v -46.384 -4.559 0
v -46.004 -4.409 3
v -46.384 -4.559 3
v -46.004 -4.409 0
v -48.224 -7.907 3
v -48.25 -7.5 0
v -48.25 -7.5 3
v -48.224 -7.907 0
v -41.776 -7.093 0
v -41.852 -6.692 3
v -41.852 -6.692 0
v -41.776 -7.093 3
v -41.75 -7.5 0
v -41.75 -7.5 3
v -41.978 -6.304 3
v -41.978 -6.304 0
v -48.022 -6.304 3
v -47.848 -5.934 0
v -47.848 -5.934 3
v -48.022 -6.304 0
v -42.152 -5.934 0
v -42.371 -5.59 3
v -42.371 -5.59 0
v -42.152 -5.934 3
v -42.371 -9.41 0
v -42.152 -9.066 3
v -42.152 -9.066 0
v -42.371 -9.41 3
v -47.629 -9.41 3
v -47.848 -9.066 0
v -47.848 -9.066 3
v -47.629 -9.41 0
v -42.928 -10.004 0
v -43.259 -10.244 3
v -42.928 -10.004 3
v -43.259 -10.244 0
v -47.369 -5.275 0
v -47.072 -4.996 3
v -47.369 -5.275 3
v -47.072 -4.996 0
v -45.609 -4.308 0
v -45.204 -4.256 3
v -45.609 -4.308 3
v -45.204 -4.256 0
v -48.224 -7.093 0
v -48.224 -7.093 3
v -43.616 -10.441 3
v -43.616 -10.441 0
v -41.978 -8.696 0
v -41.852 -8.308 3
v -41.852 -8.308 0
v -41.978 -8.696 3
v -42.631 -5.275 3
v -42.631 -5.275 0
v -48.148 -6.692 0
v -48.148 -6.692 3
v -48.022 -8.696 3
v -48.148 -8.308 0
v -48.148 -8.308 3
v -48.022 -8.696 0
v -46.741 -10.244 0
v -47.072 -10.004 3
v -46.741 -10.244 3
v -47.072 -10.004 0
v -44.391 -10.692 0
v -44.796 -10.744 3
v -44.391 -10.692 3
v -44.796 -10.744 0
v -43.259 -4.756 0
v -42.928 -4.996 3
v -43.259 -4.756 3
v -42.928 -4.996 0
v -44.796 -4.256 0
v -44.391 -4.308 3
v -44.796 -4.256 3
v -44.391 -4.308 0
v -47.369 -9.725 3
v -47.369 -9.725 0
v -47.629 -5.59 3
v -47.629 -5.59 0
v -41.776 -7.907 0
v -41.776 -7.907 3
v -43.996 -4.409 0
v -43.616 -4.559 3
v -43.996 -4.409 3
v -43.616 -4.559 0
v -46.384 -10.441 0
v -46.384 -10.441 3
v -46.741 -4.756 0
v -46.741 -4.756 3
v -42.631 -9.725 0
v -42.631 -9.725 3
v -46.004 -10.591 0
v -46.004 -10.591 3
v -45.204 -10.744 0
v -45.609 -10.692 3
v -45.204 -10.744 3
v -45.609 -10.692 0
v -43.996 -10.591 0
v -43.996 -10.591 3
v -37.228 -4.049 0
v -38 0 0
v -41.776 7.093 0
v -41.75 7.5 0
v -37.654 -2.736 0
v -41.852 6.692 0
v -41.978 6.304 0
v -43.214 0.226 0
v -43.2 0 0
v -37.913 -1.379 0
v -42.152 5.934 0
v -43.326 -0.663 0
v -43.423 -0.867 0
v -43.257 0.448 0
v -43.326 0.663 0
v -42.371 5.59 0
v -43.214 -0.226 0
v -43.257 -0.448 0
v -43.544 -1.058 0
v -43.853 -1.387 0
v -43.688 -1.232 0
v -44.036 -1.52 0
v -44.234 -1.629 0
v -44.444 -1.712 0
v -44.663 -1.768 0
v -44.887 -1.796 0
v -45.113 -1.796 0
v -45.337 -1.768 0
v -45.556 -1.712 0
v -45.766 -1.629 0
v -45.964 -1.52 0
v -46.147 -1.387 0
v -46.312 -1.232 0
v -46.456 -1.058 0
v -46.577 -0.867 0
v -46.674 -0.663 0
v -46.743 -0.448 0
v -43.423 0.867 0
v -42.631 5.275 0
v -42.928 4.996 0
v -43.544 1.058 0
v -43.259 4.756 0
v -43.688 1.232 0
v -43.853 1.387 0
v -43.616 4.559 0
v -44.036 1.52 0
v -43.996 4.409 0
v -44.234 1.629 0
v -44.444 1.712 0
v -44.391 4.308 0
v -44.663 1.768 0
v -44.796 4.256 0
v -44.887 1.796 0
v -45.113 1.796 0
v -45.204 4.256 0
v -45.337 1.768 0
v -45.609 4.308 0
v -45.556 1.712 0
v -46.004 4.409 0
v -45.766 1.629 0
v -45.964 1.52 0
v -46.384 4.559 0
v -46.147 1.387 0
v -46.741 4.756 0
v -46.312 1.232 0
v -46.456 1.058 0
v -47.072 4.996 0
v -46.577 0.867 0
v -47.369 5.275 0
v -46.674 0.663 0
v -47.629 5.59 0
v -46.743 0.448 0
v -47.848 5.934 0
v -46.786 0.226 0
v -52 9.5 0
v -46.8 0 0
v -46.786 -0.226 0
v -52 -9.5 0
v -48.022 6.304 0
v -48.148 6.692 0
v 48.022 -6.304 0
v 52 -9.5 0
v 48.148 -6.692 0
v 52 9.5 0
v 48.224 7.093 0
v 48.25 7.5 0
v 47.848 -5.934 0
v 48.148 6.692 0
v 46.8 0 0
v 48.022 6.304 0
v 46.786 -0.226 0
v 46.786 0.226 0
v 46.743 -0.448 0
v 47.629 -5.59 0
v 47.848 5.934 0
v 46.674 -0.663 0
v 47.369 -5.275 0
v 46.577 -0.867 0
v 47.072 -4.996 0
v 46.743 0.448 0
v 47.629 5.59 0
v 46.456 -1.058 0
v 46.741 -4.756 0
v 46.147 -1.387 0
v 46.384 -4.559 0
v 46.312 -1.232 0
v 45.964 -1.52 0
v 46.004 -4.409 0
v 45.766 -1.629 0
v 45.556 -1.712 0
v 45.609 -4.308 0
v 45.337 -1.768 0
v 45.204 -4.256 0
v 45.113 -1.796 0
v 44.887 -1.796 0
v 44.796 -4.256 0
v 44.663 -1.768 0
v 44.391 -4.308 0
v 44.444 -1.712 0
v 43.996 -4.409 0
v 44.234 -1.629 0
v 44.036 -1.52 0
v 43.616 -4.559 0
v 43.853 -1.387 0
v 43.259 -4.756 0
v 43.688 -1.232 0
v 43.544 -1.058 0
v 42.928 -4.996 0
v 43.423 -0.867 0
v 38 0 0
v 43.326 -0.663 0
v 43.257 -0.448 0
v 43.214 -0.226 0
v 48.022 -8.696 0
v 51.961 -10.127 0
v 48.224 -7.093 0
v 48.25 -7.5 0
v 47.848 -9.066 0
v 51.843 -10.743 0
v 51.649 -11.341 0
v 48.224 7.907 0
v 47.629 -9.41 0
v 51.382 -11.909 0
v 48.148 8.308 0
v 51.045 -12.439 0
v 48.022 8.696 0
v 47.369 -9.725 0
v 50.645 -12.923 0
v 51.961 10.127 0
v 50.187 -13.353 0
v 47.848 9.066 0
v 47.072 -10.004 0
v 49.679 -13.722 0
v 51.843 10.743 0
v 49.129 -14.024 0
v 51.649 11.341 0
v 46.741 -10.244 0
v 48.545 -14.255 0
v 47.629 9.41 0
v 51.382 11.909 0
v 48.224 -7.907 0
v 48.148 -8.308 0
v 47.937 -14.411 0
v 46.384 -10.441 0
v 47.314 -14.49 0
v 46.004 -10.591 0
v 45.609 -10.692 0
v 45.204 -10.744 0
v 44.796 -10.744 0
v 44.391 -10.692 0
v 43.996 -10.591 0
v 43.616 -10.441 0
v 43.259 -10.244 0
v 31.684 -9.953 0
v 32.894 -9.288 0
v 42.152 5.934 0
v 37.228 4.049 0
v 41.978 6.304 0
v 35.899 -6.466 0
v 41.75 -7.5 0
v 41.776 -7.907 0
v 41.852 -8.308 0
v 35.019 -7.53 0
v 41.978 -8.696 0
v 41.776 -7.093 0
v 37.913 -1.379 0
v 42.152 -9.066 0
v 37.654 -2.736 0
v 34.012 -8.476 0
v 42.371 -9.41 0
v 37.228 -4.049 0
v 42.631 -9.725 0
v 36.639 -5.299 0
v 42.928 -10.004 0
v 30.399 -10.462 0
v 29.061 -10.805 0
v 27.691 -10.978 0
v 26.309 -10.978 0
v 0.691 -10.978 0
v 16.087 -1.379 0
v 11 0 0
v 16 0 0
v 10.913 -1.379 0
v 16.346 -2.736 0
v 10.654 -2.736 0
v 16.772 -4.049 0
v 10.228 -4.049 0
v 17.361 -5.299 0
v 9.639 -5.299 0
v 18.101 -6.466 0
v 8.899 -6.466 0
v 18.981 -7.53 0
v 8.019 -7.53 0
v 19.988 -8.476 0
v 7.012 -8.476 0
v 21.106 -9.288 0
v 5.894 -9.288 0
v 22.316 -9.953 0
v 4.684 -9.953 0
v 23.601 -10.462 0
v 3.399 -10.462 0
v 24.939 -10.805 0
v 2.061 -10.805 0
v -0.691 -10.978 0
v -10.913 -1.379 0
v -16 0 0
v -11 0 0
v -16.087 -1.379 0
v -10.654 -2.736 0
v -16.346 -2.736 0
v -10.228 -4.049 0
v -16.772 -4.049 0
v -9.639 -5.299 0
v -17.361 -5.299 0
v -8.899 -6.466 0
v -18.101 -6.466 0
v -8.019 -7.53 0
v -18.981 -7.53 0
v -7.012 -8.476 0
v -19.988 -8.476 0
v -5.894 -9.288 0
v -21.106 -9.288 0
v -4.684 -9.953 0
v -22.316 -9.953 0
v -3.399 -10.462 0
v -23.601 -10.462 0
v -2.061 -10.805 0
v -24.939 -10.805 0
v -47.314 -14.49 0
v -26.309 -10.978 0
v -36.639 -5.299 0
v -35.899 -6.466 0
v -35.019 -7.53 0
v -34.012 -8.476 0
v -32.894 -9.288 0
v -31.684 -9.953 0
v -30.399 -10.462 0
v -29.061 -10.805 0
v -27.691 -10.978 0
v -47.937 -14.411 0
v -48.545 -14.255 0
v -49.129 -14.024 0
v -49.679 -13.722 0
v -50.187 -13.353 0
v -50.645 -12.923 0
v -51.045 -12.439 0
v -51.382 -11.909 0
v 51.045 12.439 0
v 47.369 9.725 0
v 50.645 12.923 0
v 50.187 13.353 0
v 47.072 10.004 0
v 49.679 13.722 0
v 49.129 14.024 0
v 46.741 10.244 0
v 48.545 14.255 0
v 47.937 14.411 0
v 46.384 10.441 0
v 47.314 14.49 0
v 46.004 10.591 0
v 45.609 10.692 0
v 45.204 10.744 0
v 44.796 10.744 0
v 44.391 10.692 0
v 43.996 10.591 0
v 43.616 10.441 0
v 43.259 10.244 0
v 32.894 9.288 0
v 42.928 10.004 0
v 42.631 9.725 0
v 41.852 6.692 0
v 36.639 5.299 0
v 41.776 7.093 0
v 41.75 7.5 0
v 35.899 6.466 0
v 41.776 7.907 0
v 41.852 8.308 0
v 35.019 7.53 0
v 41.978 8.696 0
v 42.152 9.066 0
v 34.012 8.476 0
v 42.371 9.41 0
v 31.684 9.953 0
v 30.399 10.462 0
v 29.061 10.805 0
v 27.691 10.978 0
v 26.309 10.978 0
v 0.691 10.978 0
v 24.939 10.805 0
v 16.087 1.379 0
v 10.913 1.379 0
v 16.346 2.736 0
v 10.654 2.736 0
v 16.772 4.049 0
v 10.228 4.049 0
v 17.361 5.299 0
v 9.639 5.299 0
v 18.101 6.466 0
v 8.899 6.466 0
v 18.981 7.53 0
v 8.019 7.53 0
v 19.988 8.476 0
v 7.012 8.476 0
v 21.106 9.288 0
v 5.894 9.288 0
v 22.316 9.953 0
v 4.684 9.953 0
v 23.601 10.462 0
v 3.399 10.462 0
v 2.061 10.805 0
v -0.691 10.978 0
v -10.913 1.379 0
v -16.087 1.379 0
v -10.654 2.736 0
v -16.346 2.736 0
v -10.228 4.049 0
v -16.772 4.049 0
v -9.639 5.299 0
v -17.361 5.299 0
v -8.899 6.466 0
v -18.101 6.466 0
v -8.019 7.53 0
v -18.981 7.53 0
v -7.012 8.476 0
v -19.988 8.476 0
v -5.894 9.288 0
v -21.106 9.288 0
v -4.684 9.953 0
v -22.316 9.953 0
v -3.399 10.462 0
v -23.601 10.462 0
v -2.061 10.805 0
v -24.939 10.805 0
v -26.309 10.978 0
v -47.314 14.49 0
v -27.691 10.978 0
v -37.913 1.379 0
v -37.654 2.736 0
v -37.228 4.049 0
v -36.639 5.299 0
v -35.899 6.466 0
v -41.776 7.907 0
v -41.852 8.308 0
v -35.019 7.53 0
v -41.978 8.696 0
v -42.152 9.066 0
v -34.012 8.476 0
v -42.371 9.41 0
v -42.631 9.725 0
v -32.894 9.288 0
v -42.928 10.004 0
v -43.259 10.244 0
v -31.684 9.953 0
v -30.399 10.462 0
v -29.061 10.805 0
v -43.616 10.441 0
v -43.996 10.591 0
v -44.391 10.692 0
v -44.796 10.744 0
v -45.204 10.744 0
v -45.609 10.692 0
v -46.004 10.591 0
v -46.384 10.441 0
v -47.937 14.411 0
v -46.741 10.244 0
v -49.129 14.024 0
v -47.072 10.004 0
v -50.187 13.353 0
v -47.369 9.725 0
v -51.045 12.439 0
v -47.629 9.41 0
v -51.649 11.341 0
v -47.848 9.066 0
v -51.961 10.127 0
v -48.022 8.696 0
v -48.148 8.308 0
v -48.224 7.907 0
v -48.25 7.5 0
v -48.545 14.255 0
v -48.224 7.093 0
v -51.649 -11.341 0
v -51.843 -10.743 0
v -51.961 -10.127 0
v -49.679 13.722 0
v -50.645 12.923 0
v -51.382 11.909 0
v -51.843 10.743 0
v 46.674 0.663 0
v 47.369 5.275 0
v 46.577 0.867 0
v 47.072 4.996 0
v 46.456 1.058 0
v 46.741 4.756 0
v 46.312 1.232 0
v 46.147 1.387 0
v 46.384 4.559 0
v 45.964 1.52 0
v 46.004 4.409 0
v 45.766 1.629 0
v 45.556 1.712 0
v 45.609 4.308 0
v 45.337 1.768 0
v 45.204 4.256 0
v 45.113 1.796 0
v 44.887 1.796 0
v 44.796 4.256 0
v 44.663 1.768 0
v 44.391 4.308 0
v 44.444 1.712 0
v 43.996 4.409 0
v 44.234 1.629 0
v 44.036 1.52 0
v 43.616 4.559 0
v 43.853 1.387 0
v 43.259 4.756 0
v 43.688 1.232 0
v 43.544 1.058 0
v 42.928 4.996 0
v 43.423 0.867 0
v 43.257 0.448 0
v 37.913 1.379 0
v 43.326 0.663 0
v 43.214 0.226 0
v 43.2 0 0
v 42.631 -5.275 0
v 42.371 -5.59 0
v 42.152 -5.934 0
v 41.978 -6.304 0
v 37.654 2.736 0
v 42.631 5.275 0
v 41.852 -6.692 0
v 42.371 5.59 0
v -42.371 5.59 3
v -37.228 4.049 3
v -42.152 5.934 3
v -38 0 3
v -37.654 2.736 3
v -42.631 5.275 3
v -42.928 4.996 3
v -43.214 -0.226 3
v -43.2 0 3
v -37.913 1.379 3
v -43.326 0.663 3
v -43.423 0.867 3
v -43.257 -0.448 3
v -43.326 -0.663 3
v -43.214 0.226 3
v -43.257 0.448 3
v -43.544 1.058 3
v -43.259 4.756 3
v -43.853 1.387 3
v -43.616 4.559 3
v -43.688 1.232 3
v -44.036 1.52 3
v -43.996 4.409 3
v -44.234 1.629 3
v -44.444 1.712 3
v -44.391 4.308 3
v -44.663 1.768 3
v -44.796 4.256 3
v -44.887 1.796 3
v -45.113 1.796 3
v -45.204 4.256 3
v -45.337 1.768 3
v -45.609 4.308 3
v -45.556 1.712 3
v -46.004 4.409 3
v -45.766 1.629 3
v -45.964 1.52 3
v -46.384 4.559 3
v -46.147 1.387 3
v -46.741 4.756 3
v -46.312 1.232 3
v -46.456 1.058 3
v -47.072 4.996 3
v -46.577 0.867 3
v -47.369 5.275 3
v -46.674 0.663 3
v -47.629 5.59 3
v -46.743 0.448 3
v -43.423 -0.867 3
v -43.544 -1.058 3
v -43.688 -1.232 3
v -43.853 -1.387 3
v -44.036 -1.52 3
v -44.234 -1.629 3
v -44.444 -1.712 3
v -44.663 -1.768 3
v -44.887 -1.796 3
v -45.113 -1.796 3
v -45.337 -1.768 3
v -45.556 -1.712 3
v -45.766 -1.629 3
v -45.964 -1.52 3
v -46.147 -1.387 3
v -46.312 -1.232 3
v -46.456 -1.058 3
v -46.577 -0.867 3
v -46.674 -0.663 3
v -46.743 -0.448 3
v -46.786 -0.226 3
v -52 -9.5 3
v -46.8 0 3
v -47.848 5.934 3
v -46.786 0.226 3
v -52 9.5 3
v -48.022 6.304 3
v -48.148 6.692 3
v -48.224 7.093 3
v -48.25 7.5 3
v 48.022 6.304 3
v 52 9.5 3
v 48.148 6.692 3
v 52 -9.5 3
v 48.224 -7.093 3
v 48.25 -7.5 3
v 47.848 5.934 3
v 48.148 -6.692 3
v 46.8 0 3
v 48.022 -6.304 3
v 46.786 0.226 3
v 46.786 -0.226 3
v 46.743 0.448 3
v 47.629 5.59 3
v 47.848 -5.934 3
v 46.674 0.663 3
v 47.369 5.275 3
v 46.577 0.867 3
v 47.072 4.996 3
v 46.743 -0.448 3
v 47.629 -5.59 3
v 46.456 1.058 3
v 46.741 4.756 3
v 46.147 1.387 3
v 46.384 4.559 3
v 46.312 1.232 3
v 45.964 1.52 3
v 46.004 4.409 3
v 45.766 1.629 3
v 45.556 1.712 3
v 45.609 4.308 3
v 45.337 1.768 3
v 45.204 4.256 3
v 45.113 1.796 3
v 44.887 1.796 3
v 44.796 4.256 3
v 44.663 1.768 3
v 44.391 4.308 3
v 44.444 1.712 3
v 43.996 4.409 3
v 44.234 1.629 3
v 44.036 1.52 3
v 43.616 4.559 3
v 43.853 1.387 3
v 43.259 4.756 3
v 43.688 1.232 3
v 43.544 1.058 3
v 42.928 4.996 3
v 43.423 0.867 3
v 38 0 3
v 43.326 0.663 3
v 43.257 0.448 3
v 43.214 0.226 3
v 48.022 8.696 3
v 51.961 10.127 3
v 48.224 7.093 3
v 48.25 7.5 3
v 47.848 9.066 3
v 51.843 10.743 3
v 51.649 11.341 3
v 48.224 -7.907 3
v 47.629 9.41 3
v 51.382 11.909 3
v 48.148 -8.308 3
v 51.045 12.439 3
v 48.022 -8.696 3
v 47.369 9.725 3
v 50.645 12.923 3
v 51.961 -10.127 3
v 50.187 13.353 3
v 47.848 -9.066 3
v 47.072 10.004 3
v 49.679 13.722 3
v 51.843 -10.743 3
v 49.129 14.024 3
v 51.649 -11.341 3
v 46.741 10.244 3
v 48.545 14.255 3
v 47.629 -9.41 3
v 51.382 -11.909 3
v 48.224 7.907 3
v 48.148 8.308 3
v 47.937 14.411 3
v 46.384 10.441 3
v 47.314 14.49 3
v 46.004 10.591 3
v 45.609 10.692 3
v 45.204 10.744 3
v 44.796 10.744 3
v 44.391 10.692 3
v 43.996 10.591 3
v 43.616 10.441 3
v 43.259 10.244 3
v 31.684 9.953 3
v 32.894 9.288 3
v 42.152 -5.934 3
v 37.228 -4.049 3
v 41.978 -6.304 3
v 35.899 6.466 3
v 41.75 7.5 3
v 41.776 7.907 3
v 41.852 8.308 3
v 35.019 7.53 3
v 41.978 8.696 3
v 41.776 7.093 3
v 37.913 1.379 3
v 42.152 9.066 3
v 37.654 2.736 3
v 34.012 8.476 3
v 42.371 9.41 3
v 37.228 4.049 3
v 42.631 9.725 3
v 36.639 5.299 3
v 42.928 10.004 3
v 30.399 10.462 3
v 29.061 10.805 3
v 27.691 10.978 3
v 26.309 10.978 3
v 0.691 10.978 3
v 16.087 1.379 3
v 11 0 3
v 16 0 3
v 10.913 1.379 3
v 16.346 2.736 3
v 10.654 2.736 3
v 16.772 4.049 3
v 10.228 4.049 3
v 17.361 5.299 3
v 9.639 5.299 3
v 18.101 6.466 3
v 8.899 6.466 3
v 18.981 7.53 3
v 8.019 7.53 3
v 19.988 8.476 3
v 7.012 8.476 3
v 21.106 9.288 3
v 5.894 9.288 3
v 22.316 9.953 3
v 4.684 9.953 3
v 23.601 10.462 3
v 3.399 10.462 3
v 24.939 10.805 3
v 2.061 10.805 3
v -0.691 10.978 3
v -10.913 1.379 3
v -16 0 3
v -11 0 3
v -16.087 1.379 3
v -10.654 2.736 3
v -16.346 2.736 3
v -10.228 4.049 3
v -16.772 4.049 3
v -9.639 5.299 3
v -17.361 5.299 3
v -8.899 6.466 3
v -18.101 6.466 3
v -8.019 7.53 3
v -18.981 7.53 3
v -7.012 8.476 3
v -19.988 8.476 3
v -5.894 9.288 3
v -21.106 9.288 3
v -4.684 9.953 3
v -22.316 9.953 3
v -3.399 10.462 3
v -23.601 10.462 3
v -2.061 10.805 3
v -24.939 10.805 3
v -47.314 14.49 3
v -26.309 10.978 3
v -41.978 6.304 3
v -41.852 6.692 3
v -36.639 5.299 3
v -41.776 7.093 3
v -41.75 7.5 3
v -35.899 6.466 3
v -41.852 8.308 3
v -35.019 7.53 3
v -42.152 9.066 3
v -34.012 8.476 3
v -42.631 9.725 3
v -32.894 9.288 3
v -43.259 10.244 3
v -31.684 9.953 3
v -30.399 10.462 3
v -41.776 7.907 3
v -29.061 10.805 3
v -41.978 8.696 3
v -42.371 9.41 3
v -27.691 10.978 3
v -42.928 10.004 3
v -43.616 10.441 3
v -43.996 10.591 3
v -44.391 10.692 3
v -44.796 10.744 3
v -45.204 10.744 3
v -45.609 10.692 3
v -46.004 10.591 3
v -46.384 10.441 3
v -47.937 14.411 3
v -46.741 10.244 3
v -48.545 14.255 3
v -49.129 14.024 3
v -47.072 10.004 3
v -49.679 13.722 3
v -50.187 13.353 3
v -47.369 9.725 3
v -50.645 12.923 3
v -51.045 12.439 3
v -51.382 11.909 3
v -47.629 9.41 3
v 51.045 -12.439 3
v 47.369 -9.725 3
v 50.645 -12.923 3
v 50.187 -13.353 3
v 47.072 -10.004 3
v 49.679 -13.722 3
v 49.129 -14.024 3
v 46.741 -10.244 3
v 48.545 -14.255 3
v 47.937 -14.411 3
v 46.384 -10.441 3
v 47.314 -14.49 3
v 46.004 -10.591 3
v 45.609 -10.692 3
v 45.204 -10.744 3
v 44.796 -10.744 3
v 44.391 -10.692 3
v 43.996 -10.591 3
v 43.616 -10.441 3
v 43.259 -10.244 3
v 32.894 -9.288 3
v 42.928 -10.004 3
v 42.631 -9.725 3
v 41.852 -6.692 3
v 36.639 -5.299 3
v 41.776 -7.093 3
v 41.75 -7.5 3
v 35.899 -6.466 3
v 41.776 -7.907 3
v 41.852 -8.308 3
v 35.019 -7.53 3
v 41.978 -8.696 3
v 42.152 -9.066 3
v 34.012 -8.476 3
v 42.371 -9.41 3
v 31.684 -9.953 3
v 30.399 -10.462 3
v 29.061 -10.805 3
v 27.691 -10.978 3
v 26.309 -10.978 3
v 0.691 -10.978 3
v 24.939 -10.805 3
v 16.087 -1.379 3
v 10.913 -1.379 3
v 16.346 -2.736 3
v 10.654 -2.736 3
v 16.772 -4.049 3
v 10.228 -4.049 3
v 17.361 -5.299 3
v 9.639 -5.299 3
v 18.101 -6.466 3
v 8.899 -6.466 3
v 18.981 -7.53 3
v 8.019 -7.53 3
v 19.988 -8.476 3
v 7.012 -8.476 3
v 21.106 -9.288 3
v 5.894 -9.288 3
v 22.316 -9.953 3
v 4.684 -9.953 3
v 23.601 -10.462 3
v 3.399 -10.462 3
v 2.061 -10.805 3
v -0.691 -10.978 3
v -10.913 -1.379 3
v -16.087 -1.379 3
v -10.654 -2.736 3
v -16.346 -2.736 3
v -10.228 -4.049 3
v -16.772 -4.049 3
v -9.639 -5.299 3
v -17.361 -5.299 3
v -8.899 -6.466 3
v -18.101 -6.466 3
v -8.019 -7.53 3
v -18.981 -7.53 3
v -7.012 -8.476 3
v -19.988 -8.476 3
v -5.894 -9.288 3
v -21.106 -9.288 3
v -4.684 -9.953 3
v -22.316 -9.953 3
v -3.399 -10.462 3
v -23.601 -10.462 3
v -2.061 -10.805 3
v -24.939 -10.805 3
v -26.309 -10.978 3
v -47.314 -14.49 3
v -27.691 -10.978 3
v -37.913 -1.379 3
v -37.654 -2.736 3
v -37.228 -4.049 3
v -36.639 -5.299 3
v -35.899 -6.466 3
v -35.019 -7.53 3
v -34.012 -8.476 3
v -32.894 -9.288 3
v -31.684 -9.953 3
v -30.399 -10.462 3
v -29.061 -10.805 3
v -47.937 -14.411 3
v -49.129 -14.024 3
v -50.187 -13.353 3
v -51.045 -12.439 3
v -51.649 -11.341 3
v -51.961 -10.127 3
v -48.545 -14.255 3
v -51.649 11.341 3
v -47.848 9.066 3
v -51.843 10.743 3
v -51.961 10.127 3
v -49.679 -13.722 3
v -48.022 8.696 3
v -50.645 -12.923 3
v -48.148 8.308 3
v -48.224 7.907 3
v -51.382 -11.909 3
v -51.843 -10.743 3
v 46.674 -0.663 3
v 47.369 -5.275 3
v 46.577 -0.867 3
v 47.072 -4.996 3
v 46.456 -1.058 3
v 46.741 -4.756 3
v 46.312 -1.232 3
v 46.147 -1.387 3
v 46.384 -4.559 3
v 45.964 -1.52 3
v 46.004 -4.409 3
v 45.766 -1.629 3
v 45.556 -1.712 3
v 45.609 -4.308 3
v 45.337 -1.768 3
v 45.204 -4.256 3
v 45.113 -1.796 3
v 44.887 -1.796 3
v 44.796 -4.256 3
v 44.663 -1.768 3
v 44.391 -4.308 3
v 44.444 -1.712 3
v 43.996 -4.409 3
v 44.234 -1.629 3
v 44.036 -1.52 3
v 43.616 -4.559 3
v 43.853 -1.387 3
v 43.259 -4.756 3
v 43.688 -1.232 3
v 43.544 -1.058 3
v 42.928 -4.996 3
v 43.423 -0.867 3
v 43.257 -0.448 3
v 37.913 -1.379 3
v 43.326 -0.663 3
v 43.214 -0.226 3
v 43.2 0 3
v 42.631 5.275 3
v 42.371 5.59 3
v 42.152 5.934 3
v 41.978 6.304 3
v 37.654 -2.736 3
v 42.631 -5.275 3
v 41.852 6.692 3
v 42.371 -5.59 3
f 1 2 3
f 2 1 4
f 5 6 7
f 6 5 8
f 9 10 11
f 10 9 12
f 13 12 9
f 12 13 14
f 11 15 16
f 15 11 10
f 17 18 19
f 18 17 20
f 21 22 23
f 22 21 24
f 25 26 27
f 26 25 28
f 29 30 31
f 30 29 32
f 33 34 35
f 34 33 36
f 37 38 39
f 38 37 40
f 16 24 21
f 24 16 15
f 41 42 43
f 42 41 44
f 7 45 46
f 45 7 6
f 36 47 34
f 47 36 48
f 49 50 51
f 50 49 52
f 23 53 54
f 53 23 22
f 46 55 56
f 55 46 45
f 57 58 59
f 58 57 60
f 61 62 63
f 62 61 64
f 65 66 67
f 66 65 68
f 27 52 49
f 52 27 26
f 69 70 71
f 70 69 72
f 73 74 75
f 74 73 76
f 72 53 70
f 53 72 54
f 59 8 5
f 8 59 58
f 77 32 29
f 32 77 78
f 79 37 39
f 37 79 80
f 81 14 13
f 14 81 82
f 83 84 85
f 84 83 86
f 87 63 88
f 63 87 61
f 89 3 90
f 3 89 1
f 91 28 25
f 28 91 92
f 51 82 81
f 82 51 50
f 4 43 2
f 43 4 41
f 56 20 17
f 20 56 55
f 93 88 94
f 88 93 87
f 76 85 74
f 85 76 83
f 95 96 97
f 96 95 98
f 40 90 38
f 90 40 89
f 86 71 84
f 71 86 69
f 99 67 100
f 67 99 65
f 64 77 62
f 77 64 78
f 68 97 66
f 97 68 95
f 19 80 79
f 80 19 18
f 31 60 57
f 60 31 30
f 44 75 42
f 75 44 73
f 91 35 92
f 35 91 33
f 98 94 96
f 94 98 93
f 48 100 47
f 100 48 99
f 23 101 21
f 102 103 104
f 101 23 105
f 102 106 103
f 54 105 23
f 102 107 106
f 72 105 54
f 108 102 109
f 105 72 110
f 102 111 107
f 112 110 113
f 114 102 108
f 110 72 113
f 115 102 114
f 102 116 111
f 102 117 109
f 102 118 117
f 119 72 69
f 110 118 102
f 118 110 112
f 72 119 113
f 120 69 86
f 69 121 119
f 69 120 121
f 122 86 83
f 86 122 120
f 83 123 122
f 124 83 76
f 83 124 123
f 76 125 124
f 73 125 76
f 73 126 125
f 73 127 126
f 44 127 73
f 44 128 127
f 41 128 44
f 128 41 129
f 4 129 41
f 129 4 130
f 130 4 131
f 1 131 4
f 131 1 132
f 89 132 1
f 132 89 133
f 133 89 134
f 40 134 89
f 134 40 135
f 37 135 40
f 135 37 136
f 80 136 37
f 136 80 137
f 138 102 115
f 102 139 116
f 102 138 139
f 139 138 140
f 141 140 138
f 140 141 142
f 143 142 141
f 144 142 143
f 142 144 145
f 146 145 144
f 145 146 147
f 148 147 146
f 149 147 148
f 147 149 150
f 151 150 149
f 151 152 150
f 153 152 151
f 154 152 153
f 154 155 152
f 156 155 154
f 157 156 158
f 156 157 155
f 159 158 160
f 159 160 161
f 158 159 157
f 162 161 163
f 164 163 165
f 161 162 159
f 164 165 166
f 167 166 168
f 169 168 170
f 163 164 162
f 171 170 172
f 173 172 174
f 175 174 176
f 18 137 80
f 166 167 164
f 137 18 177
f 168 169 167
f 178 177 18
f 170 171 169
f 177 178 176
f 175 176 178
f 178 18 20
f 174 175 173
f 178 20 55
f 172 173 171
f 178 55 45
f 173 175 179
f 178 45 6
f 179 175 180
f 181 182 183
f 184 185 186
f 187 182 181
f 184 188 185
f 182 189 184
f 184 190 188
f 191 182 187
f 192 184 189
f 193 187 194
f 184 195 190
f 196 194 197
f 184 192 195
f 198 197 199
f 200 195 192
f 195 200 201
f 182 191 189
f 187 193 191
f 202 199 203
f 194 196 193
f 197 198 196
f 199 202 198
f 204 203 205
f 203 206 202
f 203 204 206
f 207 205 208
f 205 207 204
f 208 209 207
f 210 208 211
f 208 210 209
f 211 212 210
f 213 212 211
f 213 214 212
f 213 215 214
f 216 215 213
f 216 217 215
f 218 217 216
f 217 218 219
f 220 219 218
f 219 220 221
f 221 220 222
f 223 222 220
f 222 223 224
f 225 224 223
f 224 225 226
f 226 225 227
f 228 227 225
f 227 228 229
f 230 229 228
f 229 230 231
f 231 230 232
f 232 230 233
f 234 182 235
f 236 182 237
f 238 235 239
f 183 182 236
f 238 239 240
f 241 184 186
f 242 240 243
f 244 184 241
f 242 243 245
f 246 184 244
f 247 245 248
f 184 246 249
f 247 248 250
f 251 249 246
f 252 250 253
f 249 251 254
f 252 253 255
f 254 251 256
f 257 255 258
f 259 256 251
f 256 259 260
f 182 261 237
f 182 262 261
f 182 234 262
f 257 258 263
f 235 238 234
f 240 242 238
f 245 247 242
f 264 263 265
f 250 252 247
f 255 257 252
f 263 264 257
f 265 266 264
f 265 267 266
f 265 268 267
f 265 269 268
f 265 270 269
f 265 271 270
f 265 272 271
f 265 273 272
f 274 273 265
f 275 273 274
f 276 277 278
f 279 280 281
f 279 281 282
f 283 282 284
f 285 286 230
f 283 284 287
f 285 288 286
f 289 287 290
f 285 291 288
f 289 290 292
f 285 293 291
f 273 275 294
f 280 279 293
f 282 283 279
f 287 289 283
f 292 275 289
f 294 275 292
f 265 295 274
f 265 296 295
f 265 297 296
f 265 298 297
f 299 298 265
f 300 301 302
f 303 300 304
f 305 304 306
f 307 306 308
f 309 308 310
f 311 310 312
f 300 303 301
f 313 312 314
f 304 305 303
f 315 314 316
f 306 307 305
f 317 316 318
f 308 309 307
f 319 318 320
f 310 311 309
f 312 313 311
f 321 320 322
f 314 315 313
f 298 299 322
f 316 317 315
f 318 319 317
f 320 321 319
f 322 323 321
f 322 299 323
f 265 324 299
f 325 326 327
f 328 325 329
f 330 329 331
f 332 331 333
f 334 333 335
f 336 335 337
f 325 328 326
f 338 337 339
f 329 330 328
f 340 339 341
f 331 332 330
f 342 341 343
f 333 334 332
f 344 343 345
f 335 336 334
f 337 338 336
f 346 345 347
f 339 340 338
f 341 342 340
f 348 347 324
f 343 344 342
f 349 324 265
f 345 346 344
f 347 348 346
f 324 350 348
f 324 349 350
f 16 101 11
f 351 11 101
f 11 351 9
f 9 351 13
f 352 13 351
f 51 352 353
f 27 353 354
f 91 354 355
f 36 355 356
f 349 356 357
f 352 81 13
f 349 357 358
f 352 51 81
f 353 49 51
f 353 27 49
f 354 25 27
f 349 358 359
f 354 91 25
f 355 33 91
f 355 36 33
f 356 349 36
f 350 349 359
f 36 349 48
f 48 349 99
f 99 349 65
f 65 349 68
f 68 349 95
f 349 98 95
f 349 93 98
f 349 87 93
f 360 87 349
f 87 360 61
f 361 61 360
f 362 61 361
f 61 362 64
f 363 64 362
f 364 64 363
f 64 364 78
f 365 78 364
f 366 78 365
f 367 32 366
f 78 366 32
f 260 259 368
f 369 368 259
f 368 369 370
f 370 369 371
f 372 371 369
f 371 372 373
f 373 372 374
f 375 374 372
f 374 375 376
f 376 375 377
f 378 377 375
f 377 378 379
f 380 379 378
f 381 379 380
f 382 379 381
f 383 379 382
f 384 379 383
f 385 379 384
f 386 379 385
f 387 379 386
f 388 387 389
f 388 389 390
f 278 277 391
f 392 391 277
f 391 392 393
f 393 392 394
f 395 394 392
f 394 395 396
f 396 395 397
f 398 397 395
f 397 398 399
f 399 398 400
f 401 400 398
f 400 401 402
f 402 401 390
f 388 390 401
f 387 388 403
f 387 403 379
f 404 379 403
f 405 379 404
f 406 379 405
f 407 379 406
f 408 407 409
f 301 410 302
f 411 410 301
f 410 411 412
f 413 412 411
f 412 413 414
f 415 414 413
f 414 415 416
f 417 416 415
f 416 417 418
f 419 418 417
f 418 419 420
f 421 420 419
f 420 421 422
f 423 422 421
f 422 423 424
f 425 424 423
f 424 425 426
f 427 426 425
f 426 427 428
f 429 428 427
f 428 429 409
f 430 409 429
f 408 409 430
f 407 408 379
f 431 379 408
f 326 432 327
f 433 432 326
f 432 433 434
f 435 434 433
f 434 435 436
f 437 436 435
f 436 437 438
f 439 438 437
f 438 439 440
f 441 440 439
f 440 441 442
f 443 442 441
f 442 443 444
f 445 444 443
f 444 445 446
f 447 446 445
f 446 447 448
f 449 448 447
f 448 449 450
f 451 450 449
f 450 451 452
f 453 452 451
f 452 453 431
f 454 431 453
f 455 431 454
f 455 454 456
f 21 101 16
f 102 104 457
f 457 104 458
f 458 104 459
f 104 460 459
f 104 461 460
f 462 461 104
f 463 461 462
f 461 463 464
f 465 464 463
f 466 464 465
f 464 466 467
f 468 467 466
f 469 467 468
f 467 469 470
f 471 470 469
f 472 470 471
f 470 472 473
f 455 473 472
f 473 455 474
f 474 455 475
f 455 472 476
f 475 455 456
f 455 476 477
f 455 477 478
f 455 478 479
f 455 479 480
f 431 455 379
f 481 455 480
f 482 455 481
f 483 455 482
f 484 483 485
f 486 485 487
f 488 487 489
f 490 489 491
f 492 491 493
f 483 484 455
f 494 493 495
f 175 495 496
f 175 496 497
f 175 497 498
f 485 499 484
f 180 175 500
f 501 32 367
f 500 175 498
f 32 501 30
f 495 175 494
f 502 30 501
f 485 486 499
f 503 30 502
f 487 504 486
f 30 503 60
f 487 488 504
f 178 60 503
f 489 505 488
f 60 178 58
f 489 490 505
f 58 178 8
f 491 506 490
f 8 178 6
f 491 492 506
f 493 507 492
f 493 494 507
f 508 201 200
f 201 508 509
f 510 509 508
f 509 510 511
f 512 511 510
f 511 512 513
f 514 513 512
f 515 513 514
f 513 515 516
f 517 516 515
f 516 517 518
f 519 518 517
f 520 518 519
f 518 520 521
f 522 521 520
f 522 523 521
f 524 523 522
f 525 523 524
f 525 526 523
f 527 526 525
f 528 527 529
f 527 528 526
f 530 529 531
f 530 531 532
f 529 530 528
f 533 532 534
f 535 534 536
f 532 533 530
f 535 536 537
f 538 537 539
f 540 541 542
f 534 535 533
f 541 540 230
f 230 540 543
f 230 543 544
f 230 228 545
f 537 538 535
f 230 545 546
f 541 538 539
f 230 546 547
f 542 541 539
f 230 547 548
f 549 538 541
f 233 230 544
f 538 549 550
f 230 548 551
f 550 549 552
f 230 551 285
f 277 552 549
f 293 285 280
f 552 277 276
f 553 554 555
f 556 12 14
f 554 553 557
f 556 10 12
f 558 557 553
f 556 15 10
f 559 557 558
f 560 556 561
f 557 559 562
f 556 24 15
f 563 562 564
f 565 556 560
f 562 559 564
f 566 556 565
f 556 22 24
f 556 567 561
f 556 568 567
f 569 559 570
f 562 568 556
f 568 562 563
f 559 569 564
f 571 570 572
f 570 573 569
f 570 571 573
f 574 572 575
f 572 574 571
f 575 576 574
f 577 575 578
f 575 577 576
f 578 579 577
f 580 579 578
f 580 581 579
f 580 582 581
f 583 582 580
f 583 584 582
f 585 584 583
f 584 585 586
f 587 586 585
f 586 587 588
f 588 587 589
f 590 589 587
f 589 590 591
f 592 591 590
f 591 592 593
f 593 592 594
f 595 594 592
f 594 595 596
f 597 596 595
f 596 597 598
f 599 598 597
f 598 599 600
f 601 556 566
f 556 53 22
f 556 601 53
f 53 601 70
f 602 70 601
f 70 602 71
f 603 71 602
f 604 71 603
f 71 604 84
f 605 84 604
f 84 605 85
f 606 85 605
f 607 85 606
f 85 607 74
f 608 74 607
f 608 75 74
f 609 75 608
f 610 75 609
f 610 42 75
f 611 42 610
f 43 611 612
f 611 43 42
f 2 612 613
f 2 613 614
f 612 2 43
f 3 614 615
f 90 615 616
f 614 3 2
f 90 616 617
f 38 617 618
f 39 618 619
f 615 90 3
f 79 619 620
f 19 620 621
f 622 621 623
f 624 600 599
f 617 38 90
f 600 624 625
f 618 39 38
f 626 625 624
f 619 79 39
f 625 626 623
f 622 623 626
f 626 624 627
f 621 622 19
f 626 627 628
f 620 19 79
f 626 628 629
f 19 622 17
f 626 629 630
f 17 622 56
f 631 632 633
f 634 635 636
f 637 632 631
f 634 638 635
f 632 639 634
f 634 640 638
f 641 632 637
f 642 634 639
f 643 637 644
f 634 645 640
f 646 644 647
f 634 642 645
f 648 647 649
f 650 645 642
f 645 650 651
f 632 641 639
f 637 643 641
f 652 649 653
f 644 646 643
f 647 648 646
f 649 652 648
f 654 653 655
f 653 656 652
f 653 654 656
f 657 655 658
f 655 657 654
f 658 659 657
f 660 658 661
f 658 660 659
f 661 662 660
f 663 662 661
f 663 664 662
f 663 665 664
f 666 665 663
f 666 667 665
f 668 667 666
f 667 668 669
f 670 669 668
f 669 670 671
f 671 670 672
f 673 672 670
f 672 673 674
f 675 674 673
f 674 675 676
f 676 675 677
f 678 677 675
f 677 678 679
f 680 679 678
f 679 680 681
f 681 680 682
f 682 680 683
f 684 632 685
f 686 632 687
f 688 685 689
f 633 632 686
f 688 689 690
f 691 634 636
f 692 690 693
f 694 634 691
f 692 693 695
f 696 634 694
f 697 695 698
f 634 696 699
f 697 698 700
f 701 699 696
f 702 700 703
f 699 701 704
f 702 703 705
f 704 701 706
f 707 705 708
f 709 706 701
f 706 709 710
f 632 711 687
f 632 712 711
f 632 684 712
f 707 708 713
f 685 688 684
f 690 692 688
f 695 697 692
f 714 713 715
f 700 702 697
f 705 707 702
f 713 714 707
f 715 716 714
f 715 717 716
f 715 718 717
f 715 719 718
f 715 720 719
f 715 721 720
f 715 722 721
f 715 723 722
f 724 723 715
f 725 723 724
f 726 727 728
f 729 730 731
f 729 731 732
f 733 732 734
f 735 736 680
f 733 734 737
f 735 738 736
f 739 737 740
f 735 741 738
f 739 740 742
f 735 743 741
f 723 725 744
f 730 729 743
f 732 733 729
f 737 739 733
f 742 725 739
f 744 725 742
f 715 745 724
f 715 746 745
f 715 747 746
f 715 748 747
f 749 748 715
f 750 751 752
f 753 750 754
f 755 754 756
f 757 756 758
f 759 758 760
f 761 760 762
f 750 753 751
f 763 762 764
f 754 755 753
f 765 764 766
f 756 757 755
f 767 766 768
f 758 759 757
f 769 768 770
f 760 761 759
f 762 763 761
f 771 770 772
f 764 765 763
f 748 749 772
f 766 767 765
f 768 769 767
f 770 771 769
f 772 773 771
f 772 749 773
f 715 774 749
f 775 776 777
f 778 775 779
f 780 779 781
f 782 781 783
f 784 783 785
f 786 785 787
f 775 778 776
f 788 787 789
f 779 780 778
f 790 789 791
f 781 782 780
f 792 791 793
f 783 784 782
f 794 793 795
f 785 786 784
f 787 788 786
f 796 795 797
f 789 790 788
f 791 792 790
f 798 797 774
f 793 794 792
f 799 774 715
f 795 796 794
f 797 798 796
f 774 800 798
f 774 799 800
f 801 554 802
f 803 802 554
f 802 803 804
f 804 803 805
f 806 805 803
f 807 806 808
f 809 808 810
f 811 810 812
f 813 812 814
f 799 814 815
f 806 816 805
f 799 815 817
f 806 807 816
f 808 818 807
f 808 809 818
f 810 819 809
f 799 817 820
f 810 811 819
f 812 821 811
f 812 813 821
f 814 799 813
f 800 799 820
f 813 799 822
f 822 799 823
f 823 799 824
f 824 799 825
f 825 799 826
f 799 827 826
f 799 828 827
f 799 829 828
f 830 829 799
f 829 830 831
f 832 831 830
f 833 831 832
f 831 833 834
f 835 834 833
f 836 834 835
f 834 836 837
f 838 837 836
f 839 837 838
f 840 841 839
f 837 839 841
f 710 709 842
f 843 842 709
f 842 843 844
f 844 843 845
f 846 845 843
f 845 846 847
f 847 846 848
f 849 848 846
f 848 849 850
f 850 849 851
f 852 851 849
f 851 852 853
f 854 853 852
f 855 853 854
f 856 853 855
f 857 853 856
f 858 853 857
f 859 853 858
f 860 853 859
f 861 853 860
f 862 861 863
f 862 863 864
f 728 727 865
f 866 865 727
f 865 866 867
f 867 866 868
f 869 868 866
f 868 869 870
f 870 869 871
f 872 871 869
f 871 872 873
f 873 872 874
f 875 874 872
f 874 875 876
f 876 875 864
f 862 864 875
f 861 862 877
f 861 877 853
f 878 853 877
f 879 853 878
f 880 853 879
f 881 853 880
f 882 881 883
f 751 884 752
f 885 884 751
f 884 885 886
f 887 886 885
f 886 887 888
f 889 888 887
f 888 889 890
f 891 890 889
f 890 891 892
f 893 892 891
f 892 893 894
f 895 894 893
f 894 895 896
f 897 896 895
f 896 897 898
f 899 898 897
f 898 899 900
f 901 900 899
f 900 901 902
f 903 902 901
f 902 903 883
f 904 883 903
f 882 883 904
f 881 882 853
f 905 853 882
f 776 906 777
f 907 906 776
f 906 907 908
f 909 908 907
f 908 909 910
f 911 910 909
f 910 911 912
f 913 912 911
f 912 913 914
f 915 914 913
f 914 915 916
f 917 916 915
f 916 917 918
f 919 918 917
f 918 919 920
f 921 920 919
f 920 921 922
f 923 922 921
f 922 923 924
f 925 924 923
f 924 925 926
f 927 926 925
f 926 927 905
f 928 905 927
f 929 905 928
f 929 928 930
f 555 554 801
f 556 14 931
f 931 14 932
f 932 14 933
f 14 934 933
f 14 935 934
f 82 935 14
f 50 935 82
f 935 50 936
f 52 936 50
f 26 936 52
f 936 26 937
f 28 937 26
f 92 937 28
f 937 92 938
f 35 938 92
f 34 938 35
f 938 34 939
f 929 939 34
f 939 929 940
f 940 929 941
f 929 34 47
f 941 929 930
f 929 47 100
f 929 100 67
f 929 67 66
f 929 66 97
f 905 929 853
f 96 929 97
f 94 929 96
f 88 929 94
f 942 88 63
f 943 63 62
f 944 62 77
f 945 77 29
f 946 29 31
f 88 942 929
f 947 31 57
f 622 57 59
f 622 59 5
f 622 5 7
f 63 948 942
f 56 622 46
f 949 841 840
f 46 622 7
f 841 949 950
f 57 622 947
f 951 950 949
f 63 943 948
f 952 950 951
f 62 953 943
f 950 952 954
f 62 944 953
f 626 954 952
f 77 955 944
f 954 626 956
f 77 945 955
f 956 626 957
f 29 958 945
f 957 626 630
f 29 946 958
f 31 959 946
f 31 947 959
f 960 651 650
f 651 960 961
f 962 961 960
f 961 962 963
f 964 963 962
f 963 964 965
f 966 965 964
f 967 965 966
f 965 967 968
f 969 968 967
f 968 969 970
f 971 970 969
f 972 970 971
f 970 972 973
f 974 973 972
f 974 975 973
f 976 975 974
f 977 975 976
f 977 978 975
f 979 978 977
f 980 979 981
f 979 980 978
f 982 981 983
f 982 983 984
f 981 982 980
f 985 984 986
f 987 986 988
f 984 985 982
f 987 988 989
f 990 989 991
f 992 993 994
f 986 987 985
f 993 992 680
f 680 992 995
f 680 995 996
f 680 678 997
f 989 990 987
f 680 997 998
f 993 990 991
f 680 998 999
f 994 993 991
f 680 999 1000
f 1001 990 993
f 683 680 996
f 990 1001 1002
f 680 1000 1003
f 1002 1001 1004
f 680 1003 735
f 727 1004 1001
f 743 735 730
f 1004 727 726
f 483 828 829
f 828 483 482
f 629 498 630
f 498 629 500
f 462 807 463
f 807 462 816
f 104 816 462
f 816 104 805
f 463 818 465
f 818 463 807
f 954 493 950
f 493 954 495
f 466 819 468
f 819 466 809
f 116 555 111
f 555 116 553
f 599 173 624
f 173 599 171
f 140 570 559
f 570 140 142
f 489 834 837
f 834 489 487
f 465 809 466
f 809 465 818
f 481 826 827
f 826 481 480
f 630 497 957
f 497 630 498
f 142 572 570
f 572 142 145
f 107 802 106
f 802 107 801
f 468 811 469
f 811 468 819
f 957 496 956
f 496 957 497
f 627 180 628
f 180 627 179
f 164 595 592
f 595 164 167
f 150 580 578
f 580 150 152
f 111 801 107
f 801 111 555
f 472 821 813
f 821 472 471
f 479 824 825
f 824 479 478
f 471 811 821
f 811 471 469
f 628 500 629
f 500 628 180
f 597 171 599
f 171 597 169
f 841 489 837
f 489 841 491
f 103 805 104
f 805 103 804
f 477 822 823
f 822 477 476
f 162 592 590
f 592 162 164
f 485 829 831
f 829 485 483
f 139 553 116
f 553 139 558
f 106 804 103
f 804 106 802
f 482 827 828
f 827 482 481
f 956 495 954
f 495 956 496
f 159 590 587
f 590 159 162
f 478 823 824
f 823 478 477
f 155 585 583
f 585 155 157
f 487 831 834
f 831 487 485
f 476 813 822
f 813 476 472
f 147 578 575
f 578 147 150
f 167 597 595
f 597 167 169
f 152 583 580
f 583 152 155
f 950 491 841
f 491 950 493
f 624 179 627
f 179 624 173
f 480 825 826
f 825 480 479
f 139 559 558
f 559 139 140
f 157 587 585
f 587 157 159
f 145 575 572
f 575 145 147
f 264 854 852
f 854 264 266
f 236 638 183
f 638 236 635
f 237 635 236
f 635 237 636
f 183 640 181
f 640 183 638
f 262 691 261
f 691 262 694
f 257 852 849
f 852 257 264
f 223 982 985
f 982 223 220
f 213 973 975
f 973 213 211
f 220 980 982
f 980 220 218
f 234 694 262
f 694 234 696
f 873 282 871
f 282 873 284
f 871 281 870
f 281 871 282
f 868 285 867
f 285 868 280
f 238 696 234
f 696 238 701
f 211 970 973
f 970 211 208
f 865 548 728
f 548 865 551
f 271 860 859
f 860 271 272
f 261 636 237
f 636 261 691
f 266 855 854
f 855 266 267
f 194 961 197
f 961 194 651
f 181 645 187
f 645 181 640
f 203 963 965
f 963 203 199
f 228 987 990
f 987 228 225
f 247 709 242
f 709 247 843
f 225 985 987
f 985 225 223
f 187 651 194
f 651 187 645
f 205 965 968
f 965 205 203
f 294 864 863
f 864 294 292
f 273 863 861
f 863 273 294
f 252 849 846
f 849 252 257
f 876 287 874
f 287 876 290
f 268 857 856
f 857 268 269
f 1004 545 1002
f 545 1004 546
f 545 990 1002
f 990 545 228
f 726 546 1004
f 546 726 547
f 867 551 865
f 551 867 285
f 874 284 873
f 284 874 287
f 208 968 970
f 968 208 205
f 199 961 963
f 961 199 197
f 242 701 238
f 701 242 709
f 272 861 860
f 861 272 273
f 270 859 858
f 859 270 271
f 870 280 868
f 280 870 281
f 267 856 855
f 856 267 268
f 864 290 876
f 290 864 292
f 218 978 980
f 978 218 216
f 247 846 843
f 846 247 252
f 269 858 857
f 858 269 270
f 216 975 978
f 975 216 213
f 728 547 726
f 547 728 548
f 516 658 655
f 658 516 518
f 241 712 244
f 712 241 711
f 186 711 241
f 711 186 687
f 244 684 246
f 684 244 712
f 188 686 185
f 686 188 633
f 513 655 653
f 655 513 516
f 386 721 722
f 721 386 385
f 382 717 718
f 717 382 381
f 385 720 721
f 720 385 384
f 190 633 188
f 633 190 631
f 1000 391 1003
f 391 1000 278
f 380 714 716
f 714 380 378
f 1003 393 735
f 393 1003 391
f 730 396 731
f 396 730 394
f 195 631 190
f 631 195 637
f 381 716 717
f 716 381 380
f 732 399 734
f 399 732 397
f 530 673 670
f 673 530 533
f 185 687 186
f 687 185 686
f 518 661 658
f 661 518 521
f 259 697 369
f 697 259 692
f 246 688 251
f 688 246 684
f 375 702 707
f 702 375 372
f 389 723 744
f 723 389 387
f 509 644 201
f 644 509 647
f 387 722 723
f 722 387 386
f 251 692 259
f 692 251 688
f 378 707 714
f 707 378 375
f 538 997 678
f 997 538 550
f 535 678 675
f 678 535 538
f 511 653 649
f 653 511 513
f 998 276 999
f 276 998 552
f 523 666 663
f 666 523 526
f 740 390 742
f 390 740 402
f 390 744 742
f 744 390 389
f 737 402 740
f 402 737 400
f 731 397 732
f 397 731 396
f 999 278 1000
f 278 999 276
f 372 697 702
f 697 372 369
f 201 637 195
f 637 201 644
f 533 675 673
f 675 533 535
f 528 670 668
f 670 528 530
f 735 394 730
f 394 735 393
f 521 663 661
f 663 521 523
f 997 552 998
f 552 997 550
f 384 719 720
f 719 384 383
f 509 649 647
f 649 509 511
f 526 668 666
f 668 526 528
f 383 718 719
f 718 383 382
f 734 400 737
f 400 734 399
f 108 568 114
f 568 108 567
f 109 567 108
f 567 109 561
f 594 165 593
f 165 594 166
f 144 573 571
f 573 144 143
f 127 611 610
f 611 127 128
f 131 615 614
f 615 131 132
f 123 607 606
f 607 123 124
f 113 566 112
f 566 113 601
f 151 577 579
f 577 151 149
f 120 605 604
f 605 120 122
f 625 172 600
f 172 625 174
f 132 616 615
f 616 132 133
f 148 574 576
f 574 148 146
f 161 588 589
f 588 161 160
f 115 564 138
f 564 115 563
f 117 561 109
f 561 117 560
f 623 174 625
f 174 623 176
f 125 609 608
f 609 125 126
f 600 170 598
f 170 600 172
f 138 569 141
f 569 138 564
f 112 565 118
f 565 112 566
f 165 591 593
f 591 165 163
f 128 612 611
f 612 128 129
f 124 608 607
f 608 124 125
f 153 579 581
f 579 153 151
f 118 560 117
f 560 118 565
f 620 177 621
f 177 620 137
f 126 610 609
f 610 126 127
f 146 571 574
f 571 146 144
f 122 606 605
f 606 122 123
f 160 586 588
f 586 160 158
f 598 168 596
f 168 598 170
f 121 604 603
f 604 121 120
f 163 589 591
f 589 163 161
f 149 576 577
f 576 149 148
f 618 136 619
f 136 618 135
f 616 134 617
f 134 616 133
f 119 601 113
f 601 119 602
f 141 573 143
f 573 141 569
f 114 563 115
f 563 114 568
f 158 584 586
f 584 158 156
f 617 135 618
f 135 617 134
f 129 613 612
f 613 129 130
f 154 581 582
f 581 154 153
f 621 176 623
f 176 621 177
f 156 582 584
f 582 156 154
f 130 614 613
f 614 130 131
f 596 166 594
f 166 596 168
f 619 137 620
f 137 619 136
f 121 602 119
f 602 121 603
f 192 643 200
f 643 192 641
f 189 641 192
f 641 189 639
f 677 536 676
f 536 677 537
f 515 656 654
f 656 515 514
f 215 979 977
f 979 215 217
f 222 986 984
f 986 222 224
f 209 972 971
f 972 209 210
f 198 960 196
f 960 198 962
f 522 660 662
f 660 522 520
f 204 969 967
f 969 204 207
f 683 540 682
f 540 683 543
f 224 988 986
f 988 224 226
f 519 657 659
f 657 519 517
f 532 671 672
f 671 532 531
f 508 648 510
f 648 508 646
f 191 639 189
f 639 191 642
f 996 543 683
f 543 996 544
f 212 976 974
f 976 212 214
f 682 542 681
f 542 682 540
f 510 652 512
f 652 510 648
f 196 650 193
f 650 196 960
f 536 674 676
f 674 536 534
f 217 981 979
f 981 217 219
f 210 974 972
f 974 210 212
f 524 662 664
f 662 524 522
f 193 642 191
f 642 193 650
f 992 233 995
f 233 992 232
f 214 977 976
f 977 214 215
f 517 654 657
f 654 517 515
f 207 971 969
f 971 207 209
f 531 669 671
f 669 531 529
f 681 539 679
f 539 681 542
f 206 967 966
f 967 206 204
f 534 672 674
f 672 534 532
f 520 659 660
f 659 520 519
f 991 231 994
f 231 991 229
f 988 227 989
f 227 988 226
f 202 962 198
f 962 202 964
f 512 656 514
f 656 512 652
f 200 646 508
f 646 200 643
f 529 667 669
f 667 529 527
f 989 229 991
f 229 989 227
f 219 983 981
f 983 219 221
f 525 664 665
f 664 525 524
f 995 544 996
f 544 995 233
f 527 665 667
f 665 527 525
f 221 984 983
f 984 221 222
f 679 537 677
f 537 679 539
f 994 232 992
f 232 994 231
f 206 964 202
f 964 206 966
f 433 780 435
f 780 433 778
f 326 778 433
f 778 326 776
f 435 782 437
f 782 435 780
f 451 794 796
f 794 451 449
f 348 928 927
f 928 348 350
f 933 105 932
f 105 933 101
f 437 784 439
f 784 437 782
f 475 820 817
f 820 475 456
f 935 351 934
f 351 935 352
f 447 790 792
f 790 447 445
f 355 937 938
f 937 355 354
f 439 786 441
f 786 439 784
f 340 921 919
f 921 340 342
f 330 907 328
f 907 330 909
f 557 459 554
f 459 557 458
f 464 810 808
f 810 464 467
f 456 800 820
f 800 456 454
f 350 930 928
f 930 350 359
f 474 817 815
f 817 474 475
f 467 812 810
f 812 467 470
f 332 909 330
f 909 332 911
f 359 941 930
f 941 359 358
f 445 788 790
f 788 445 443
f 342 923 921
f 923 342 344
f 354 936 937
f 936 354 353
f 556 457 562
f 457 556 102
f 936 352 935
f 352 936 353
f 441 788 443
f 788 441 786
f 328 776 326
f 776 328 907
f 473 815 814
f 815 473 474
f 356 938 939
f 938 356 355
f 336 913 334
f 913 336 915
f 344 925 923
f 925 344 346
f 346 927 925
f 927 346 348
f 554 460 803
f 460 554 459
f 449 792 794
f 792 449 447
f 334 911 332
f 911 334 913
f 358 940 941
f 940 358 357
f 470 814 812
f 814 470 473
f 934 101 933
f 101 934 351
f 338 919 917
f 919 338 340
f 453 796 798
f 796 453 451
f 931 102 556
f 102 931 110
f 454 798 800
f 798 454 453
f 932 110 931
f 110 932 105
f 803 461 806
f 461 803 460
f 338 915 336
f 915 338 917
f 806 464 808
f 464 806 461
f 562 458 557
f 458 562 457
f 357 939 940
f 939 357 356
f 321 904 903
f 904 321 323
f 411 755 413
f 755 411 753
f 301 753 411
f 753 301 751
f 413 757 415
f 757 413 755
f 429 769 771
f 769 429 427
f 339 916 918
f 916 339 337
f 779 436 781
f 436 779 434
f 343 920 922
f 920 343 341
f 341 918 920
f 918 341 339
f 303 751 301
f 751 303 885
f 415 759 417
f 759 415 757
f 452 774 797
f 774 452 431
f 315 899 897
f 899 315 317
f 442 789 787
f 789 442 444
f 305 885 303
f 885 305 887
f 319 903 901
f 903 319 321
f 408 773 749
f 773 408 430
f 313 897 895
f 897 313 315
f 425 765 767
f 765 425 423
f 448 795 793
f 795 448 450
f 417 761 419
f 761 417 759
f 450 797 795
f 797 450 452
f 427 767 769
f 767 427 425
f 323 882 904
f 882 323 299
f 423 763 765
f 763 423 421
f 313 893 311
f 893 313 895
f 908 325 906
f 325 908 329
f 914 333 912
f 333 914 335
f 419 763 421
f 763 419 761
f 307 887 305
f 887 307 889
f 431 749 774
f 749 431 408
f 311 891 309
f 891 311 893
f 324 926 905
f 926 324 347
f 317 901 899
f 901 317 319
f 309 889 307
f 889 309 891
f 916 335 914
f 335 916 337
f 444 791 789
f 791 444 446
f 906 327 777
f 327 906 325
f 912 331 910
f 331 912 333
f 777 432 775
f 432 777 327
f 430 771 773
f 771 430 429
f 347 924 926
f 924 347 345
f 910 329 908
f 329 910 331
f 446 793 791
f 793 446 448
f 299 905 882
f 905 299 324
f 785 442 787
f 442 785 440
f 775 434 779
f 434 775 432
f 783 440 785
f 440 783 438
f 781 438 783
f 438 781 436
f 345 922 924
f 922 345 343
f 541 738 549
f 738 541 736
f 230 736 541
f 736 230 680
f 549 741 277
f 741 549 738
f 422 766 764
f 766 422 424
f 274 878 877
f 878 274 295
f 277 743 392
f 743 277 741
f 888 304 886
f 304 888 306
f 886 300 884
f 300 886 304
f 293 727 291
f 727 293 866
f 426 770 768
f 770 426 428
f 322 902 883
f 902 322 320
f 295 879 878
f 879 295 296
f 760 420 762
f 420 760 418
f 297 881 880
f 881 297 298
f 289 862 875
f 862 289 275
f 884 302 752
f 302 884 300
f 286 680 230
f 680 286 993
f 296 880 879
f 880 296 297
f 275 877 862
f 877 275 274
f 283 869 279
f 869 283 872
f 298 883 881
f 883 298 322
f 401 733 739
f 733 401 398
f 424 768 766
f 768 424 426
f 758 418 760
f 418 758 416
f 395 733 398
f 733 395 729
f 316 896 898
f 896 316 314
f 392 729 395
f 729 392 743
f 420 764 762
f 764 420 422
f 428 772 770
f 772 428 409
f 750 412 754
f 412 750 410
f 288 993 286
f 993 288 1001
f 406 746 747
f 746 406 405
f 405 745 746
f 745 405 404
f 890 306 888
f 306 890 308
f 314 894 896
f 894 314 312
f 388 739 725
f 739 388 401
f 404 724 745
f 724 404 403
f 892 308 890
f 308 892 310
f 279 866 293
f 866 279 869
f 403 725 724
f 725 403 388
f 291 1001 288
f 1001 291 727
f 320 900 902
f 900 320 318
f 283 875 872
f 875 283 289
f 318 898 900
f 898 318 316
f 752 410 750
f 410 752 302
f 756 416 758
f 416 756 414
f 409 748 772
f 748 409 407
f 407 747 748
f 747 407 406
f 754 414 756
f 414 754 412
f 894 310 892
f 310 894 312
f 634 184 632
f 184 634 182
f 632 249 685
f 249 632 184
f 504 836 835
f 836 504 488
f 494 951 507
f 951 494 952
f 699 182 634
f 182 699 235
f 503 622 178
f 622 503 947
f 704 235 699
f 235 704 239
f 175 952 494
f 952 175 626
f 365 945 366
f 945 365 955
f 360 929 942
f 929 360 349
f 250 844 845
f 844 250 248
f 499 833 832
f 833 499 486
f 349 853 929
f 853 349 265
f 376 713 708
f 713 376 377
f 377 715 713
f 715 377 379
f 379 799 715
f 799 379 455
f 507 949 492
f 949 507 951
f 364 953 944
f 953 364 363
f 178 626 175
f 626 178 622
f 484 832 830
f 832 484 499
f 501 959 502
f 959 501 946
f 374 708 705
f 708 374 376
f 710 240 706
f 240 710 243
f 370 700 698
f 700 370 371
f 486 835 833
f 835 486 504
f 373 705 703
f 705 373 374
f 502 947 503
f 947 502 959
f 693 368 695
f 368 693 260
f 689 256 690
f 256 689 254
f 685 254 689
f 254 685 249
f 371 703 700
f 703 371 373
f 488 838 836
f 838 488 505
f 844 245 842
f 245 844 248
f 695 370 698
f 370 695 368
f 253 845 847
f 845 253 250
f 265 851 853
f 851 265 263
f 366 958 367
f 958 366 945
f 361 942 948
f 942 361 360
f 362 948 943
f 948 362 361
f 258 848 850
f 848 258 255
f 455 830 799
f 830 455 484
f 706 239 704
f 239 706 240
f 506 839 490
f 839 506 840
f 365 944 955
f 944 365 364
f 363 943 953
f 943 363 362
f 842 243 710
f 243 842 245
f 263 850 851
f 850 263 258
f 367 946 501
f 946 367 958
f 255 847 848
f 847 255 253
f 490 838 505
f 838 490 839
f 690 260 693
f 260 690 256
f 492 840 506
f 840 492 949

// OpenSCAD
$fn = 50;

difference() {
	union() {
		hull() {
			translate(v = [-47.0, 9.5, 0]) {
				cylinder(h = 3, r = 5);
			}
			translate(v = [47.0, 9.5, 0]) {
				cylinder(h = 3, r = 5);
			}
			translate(v = [-47.0, -9.5, 0]) {
				cylinder(h = 3, r = 5);
			}
			translate(v = [47.0, -9.5, 0]) {
				cylinder(h = 3, r = 5);
			}
		}
	}
	union() {
		translate(v = [-45.0, -7.5, 0]) {
			cylinder(h = 3, r = 3.25);
		}
		translate(v = [-45.0, 7.5, 0]) {
			cylinder(h = 3, r = 3.25);
		}
		translate(v = [45.0, -7.5, 0]) {
			cylinder(h = 3, r = 3.25);
		}
		translate(v = [45.0, 7.5, 0]) {
			cylinder(h = 3, r = 3.25);
		}
		translate(v = [-45.0, 0.0, 0]) {
			cylinder(h = 3, r = 1.8);
		}
		translate(v = [45.0, 0.0, 0]) {
			cylinder(h = 3, r = 1.8);
		}
		translate(v = [-27.0, 0, 0.0]) {
			cylinder(h = 3, r = 11.0);
		}
		cylinder(h = 3, r = 11.0);
		translate(v = [27.0, 0, 0.0]) {
			cylinder(h = 3, r = 11.0);
		}
	}
}
